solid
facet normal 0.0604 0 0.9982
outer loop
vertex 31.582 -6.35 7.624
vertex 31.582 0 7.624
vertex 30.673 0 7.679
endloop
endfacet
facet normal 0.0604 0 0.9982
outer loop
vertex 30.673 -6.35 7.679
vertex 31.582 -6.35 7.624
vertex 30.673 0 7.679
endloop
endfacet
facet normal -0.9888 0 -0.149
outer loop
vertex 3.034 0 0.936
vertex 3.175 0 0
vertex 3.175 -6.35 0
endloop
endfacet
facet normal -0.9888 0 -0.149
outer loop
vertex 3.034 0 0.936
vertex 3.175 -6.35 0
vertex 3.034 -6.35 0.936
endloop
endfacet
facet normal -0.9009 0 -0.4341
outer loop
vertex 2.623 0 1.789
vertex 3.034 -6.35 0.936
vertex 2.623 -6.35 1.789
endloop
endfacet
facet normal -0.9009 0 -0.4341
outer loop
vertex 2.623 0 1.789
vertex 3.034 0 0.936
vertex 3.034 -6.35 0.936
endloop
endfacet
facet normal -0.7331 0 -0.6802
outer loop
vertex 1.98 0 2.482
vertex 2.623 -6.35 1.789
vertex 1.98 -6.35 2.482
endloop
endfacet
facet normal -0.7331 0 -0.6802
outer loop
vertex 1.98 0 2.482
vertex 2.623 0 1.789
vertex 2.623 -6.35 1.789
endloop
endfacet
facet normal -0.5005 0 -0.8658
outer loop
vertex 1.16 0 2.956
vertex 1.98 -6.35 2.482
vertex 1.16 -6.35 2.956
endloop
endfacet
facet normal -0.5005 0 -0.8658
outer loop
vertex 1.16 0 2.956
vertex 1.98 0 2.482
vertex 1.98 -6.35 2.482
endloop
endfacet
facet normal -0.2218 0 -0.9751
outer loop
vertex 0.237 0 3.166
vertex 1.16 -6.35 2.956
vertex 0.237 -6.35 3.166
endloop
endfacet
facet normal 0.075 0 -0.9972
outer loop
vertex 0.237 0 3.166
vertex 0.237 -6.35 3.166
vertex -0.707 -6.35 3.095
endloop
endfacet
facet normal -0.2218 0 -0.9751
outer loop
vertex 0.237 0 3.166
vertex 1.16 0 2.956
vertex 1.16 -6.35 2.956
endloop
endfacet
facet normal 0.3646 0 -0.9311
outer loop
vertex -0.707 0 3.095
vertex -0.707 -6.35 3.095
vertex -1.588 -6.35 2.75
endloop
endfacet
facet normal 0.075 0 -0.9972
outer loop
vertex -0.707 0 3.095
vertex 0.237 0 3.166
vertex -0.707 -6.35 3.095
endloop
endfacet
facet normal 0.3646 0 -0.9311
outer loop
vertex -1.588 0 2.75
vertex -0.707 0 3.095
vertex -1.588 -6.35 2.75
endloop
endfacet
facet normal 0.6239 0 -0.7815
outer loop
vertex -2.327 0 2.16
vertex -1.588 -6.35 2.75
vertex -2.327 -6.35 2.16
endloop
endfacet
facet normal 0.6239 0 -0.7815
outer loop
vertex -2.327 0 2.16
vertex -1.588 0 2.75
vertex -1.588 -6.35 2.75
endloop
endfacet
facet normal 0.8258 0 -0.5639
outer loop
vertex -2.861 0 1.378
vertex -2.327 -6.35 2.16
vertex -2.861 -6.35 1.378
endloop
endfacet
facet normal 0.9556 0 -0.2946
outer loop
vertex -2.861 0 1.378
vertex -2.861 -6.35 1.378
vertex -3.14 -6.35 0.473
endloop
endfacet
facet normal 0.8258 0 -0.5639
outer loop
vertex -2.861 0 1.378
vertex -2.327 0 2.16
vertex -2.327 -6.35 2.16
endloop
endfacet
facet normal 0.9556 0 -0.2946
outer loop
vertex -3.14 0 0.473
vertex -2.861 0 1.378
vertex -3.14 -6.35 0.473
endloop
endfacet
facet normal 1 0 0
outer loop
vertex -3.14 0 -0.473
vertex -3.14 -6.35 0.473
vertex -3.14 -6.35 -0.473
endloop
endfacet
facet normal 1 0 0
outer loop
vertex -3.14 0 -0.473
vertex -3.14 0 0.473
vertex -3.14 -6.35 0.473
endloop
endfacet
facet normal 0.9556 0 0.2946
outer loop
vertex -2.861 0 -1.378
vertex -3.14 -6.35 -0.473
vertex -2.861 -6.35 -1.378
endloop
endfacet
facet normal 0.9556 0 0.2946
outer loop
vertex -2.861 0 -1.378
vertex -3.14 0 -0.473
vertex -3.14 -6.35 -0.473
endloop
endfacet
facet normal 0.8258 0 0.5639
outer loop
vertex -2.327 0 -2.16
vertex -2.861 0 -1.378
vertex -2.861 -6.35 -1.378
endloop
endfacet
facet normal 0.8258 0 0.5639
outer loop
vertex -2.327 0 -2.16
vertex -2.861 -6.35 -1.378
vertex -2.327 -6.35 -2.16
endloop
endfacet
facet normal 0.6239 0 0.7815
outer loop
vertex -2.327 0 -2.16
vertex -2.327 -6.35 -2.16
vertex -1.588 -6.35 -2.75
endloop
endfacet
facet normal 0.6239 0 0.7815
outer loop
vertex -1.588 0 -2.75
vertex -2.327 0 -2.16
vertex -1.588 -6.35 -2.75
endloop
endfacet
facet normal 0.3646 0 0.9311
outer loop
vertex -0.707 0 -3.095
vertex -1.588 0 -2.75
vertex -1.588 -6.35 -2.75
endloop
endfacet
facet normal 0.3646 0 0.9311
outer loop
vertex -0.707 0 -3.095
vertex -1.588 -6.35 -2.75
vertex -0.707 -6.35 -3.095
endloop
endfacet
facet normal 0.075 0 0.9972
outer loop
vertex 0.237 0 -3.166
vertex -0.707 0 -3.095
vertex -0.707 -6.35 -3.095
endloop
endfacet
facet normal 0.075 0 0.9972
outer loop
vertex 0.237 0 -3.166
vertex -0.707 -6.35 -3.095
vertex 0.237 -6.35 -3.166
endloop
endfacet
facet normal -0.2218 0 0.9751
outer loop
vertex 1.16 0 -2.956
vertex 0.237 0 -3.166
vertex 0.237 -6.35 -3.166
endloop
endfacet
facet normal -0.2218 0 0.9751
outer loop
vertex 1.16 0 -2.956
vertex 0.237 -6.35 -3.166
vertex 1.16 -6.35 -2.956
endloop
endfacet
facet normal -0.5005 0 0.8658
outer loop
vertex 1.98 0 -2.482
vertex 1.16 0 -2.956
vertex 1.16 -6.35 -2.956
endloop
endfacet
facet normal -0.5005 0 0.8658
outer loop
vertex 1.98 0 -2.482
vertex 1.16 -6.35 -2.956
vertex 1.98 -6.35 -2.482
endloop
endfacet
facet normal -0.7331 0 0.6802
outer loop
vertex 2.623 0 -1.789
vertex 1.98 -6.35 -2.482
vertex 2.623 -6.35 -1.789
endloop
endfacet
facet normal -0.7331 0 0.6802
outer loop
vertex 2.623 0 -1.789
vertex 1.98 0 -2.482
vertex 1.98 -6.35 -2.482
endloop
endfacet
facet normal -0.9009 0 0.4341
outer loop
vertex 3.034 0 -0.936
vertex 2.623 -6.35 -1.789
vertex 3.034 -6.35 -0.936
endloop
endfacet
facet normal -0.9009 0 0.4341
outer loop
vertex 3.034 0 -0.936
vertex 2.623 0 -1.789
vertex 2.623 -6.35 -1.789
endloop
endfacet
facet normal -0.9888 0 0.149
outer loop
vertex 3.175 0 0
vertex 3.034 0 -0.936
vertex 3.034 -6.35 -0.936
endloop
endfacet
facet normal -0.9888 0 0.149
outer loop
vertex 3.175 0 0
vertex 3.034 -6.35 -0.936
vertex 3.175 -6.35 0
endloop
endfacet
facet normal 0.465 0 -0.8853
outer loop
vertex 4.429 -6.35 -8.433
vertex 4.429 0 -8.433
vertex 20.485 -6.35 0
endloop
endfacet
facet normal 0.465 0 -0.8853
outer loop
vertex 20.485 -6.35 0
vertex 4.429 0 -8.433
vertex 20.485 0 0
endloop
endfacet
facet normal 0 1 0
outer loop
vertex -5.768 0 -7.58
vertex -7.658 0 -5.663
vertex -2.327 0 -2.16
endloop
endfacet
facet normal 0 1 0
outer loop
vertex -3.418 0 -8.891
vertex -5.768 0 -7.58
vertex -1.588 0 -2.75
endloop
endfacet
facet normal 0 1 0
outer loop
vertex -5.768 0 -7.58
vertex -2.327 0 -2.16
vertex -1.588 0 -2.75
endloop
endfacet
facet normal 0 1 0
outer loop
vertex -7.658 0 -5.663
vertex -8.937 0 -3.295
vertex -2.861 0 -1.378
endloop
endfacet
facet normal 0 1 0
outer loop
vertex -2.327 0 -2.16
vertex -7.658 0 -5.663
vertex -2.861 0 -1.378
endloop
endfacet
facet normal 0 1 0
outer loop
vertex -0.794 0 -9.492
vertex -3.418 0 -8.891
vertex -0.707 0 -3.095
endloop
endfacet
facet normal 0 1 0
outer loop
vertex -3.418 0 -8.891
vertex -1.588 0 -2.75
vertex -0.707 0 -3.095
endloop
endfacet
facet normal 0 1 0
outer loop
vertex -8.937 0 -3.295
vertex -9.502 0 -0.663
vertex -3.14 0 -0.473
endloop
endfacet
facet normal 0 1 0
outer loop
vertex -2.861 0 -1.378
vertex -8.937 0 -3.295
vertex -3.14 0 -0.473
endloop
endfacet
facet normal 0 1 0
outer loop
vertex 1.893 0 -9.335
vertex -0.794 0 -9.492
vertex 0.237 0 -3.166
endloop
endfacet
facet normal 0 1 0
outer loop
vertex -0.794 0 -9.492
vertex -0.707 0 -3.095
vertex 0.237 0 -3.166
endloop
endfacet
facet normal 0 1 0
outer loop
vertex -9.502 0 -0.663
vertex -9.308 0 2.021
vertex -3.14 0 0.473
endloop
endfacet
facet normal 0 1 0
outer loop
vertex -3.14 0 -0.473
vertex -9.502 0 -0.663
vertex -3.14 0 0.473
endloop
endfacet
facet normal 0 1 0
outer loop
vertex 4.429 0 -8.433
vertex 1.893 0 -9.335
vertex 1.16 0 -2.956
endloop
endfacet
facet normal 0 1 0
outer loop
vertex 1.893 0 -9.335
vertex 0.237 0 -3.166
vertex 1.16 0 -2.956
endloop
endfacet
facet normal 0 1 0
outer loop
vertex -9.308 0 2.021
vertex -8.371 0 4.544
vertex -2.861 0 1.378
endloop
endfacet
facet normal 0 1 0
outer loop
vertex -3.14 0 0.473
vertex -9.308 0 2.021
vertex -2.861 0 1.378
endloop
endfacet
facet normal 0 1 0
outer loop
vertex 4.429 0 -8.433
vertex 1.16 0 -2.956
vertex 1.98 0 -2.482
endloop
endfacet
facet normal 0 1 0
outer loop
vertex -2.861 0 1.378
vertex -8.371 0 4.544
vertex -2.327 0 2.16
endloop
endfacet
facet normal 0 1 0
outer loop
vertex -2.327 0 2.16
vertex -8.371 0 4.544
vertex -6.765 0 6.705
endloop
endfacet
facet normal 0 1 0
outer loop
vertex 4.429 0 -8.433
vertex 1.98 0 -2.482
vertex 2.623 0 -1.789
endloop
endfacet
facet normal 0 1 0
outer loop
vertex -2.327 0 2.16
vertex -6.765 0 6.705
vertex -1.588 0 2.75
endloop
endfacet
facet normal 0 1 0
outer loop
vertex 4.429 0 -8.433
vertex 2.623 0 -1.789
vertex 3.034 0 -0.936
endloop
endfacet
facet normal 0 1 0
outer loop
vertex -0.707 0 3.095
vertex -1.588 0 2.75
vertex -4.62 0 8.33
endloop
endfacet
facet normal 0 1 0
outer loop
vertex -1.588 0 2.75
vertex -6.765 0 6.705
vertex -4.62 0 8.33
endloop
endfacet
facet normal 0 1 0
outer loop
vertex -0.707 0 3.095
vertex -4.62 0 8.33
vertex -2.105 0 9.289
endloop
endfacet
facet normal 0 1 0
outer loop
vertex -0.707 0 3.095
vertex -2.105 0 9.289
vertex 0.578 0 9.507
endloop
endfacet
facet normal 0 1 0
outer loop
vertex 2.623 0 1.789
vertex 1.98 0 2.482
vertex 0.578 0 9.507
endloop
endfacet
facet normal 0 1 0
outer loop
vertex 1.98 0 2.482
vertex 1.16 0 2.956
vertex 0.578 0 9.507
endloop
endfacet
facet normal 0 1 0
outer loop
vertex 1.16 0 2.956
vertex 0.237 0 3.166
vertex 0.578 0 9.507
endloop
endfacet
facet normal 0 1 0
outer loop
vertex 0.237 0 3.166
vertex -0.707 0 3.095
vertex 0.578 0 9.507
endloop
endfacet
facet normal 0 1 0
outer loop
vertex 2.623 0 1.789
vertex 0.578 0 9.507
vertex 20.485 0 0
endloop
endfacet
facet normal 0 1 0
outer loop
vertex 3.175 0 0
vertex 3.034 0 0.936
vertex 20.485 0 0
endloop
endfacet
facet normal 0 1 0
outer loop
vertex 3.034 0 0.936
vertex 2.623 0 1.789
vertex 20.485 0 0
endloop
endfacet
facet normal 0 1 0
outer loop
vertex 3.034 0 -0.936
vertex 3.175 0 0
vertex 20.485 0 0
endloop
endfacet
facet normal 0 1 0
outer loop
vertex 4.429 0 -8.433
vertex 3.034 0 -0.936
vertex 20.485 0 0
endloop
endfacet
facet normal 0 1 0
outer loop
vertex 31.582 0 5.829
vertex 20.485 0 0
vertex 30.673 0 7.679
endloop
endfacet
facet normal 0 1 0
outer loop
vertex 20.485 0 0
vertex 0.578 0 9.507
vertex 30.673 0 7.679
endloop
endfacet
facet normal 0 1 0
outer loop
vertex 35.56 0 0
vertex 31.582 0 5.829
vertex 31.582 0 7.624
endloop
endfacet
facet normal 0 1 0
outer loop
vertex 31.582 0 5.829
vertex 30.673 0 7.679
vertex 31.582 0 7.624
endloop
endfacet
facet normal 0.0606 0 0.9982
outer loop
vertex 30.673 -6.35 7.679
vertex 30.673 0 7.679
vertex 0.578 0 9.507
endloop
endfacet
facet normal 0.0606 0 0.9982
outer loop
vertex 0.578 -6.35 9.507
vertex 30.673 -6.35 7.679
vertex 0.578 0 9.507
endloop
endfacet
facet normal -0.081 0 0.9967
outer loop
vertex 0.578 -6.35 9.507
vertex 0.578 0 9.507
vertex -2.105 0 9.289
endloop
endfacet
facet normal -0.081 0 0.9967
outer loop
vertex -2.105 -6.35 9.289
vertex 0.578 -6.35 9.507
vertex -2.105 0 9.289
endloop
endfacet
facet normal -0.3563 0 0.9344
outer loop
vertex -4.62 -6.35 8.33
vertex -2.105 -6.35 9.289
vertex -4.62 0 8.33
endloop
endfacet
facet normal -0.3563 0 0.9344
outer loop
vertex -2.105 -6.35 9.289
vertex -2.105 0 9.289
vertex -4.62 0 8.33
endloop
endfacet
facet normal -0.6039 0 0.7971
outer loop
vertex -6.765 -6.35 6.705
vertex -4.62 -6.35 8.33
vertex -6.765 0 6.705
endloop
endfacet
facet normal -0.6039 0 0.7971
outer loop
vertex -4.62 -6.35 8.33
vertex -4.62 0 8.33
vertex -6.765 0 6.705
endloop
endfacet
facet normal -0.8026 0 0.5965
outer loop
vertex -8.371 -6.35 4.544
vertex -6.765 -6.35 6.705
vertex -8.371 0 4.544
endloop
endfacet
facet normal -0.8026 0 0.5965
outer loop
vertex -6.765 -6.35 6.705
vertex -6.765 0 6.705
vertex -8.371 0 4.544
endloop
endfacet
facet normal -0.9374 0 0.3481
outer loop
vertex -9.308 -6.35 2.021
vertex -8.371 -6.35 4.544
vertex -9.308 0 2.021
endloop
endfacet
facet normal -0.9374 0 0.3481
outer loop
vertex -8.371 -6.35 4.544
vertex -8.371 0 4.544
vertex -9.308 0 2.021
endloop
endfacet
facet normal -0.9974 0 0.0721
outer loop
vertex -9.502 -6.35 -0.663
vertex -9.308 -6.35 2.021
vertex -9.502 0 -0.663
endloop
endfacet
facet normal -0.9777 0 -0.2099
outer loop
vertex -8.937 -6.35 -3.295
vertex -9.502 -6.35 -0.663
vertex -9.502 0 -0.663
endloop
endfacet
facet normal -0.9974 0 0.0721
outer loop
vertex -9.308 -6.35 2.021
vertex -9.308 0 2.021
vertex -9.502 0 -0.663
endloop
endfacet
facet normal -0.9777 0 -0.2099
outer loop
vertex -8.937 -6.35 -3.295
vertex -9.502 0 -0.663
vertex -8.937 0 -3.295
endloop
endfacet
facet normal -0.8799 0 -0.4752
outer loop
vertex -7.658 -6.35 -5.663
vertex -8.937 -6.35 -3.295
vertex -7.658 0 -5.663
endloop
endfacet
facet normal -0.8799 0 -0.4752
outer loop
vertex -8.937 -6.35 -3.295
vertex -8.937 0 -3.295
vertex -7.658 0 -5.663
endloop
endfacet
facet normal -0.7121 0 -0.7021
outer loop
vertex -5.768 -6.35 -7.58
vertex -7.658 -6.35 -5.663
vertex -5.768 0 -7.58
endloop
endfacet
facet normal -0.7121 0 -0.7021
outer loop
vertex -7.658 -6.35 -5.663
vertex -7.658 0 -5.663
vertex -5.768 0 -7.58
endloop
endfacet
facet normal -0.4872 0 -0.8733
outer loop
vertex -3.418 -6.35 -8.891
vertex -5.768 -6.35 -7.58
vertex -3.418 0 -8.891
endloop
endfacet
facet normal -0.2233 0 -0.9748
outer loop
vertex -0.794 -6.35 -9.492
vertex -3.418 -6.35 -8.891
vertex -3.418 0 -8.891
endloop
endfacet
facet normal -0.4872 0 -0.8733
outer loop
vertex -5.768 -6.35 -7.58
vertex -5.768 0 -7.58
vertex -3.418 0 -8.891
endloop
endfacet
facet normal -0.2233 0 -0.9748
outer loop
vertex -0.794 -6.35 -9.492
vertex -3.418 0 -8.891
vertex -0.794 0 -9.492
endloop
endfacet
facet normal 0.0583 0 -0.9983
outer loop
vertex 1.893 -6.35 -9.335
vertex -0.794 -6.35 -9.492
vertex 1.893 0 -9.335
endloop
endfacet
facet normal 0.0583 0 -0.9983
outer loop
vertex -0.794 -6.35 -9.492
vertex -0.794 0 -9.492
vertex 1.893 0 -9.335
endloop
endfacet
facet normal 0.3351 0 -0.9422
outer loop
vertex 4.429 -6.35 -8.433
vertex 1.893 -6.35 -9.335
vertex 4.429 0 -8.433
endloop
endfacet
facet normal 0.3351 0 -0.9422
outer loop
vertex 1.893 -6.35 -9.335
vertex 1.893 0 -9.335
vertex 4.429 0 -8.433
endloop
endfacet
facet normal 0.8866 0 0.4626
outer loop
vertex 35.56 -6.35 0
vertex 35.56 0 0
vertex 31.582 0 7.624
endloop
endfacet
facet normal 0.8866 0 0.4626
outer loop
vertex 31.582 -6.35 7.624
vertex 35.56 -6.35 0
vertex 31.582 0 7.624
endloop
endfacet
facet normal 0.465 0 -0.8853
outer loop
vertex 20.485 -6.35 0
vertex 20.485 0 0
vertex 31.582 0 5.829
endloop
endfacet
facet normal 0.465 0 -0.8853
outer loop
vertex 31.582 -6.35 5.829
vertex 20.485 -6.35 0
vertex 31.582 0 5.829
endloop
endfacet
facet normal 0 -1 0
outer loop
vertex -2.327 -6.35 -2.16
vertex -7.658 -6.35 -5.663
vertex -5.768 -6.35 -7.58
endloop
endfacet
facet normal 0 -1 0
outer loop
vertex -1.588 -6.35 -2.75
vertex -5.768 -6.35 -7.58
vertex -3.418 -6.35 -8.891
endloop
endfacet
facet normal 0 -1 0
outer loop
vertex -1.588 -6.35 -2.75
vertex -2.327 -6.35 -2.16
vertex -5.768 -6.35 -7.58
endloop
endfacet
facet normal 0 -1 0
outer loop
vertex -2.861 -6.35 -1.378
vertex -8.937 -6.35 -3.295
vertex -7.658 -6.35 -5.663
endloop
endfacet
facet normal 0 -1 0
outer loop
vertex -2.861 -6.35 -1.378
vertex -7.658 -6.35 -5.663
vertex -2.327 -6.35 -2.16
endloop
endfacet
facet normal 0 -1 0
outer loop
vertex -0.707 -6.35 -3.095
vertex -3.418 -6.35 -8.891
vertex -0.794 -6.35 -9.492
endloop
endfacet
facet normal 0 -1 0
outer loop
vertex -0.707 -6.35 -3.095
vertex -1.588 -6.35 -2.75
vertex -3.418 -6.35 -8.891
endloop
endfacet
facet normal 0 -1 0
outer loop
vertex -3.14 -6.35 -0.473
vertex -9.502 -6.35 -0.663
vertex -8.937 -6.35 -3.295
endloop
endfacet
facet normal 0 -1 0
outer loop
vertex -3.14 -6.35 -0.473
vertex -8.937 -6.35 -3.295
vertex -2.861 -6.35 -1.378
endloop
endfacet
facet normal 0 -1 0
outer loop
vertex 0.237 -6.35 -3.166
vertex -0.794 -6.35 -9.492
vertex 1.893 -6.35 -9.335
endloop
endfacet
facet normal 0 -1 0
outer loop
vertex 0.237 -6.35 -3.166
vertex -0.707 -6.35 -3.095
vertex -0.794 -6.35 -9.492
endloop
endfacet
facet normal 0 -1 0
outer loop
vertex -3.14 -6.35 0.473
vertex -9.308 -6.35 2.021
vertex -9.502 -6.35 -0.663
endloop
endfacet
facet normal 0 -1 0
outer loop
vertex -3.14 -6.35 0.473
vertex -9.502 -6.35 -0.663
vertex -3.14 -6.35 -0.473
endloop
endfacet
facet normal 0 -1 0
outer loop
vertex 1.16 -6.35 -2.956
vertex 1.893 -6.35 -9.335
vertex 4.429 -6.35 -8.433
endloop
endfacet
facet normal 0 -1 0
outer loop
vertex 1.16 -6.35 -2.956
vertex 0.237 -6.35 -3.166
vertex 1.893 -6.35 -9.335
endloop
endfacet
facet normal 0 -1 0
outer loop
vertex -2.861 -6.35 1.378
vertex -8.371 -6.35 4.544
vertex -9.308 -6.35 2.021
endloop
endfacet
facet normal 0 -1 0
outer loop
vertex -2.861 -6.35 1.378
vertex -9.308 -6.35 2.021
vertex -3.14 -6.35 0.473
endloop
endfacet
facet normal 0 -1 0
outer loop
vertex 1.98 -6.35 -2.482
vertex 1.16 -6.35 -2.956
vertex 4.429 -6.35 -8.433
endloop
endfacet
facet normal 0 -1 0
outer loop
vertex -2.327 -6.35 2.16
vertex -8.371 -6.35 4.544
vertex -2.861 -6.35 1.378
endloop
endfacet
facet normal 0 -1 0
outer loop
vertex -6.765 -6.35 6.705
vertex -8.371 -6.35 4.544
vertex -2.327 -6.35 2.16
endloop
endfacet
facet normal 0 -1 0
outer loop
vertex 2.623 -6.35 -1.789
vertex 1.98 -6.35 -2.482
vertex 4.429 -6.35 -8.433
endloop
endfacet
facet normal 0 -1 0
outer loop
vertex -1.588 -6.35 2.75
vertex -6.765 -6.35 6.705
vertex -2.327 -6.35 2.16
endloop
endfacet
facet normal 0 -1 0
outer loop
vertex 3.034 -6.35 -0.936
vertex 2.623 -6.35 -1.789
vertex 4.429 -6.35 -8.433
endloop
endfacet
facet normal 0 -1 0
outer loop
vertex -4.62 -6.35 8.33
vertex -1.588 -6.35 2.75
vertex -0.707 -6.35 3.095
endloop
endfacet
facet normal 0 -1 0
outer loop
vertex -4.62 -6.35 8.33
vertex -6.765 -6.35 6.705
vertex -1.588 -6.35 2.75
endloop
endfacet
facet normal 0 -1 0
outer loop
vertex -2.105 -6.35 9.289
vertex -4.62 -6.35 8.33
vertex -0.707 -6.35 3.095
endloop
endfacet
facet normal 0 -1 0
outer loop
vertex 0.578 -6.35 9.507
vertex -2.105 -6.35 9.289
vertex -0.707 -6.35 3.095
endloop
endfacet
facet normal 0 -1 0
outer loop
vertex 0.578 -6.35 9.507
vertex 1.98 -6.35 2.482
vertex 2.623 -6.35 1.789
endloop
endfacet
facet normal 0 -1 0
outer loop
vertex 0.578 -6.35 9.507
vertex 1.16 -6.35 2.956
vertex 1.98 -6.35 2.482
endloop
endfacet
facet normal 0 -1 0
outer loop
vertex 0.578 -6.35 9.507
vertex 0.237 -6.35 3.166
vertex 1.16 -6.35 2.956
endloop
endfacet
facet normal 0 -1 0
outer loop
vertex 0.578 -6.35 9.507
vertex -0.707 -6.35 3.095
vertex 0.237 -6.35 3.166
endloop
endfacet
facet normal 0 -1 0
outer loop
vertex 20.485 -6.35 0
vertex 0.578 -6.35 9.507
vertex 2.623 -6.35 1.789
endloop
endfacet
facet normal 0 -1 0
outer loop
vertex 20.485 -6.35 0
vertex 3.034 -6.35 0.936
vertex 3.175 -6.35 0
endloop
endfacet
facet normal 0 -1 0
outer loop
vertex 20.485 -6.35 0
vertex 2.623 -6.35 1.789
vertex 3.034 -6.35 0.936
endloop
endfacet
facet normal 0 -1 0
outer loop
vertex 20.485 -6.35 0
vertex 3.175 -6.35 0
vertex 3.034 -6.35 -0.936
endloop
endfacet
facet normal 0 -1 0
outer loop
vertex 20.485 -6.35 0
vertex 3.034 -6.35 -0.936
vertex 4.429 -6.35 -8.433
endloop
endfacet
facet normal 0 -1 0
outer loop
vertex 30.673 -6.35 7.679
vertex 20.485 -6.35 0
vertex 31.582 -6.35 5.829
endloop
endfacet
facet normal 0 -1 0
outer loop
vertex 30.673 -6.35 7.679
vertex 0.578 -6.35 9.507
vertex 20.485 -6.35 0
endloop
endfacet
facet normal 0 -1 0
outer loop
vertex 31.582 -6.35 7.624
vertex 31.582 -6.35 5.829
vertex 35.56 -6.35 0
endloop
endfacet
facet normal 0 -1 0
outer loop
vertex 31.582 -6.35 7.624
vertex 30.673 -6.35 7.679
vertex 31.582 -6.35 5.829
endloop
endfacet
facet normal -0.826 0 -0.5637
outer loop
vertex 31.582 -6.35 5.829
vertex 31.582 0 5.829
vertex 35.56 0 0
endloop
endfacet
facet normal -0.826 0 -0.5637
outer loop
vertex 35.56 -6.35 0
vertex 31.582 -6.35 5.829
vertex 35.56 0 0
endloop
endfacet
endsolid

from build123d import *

# Parameters (mm, degrees)
F0_R     = 3.175
F1_DEPTH = 6.35


# Not quite as in the source:
# - the program builds the solid bodies; features that only make, move or delete a surface that nothing else refers to are left out


with BuildPart() as f1:
    # F0 (on Front) → F1 (new body)
    with BuildSketch(Plane.XZ):
        with BuildLine():
            ThreePointArc((4.4289185951, -8.4326926351), (8.1520265768, -4.9264680747), (9.525, 0))
            ThreePointArc((9.525, 0), (6.936415596, 6.5277686601), (0.5776480463, 9.5074679981))
            ThreePointArc((0.5776480463, 9.5074679981), (-9.3128281564, -1.9992140281), (4.4289185951, -8.4326926351))
        make_face()
        Circle(F0_R, mode=Mode.SUBTRACT)
        with BuildLine():
            ThreePointArc((0.5776480463, 9.5074679981), (6.936415596, 6.5277686601), (9.525, 0))
            ThreePointArc((9.525, 0), (8.1520265768, -4.9264680747), (4.4289185951, -8.4326926351))
            Line((4.4289185951, -8.4326926351), (20.4848255962, 0))
            Line((20.4848255962, 0), (31.5823644939, 5.8285174748))
            Line((31.5823644939, 5.8285174748), (35.56, 0))
            Line((35.56, 0), (31.5823644939, 7.623705267))
            Line((31.5823644939, 7.623705267), (30.6727180917, 7.6789729226))
            Line((30.6727180917, 7.6789729226), (0.5776480463, 9.5074679981))
        make_face()
    extrude(amount=F1_DEPTH)


solid = f1.part
